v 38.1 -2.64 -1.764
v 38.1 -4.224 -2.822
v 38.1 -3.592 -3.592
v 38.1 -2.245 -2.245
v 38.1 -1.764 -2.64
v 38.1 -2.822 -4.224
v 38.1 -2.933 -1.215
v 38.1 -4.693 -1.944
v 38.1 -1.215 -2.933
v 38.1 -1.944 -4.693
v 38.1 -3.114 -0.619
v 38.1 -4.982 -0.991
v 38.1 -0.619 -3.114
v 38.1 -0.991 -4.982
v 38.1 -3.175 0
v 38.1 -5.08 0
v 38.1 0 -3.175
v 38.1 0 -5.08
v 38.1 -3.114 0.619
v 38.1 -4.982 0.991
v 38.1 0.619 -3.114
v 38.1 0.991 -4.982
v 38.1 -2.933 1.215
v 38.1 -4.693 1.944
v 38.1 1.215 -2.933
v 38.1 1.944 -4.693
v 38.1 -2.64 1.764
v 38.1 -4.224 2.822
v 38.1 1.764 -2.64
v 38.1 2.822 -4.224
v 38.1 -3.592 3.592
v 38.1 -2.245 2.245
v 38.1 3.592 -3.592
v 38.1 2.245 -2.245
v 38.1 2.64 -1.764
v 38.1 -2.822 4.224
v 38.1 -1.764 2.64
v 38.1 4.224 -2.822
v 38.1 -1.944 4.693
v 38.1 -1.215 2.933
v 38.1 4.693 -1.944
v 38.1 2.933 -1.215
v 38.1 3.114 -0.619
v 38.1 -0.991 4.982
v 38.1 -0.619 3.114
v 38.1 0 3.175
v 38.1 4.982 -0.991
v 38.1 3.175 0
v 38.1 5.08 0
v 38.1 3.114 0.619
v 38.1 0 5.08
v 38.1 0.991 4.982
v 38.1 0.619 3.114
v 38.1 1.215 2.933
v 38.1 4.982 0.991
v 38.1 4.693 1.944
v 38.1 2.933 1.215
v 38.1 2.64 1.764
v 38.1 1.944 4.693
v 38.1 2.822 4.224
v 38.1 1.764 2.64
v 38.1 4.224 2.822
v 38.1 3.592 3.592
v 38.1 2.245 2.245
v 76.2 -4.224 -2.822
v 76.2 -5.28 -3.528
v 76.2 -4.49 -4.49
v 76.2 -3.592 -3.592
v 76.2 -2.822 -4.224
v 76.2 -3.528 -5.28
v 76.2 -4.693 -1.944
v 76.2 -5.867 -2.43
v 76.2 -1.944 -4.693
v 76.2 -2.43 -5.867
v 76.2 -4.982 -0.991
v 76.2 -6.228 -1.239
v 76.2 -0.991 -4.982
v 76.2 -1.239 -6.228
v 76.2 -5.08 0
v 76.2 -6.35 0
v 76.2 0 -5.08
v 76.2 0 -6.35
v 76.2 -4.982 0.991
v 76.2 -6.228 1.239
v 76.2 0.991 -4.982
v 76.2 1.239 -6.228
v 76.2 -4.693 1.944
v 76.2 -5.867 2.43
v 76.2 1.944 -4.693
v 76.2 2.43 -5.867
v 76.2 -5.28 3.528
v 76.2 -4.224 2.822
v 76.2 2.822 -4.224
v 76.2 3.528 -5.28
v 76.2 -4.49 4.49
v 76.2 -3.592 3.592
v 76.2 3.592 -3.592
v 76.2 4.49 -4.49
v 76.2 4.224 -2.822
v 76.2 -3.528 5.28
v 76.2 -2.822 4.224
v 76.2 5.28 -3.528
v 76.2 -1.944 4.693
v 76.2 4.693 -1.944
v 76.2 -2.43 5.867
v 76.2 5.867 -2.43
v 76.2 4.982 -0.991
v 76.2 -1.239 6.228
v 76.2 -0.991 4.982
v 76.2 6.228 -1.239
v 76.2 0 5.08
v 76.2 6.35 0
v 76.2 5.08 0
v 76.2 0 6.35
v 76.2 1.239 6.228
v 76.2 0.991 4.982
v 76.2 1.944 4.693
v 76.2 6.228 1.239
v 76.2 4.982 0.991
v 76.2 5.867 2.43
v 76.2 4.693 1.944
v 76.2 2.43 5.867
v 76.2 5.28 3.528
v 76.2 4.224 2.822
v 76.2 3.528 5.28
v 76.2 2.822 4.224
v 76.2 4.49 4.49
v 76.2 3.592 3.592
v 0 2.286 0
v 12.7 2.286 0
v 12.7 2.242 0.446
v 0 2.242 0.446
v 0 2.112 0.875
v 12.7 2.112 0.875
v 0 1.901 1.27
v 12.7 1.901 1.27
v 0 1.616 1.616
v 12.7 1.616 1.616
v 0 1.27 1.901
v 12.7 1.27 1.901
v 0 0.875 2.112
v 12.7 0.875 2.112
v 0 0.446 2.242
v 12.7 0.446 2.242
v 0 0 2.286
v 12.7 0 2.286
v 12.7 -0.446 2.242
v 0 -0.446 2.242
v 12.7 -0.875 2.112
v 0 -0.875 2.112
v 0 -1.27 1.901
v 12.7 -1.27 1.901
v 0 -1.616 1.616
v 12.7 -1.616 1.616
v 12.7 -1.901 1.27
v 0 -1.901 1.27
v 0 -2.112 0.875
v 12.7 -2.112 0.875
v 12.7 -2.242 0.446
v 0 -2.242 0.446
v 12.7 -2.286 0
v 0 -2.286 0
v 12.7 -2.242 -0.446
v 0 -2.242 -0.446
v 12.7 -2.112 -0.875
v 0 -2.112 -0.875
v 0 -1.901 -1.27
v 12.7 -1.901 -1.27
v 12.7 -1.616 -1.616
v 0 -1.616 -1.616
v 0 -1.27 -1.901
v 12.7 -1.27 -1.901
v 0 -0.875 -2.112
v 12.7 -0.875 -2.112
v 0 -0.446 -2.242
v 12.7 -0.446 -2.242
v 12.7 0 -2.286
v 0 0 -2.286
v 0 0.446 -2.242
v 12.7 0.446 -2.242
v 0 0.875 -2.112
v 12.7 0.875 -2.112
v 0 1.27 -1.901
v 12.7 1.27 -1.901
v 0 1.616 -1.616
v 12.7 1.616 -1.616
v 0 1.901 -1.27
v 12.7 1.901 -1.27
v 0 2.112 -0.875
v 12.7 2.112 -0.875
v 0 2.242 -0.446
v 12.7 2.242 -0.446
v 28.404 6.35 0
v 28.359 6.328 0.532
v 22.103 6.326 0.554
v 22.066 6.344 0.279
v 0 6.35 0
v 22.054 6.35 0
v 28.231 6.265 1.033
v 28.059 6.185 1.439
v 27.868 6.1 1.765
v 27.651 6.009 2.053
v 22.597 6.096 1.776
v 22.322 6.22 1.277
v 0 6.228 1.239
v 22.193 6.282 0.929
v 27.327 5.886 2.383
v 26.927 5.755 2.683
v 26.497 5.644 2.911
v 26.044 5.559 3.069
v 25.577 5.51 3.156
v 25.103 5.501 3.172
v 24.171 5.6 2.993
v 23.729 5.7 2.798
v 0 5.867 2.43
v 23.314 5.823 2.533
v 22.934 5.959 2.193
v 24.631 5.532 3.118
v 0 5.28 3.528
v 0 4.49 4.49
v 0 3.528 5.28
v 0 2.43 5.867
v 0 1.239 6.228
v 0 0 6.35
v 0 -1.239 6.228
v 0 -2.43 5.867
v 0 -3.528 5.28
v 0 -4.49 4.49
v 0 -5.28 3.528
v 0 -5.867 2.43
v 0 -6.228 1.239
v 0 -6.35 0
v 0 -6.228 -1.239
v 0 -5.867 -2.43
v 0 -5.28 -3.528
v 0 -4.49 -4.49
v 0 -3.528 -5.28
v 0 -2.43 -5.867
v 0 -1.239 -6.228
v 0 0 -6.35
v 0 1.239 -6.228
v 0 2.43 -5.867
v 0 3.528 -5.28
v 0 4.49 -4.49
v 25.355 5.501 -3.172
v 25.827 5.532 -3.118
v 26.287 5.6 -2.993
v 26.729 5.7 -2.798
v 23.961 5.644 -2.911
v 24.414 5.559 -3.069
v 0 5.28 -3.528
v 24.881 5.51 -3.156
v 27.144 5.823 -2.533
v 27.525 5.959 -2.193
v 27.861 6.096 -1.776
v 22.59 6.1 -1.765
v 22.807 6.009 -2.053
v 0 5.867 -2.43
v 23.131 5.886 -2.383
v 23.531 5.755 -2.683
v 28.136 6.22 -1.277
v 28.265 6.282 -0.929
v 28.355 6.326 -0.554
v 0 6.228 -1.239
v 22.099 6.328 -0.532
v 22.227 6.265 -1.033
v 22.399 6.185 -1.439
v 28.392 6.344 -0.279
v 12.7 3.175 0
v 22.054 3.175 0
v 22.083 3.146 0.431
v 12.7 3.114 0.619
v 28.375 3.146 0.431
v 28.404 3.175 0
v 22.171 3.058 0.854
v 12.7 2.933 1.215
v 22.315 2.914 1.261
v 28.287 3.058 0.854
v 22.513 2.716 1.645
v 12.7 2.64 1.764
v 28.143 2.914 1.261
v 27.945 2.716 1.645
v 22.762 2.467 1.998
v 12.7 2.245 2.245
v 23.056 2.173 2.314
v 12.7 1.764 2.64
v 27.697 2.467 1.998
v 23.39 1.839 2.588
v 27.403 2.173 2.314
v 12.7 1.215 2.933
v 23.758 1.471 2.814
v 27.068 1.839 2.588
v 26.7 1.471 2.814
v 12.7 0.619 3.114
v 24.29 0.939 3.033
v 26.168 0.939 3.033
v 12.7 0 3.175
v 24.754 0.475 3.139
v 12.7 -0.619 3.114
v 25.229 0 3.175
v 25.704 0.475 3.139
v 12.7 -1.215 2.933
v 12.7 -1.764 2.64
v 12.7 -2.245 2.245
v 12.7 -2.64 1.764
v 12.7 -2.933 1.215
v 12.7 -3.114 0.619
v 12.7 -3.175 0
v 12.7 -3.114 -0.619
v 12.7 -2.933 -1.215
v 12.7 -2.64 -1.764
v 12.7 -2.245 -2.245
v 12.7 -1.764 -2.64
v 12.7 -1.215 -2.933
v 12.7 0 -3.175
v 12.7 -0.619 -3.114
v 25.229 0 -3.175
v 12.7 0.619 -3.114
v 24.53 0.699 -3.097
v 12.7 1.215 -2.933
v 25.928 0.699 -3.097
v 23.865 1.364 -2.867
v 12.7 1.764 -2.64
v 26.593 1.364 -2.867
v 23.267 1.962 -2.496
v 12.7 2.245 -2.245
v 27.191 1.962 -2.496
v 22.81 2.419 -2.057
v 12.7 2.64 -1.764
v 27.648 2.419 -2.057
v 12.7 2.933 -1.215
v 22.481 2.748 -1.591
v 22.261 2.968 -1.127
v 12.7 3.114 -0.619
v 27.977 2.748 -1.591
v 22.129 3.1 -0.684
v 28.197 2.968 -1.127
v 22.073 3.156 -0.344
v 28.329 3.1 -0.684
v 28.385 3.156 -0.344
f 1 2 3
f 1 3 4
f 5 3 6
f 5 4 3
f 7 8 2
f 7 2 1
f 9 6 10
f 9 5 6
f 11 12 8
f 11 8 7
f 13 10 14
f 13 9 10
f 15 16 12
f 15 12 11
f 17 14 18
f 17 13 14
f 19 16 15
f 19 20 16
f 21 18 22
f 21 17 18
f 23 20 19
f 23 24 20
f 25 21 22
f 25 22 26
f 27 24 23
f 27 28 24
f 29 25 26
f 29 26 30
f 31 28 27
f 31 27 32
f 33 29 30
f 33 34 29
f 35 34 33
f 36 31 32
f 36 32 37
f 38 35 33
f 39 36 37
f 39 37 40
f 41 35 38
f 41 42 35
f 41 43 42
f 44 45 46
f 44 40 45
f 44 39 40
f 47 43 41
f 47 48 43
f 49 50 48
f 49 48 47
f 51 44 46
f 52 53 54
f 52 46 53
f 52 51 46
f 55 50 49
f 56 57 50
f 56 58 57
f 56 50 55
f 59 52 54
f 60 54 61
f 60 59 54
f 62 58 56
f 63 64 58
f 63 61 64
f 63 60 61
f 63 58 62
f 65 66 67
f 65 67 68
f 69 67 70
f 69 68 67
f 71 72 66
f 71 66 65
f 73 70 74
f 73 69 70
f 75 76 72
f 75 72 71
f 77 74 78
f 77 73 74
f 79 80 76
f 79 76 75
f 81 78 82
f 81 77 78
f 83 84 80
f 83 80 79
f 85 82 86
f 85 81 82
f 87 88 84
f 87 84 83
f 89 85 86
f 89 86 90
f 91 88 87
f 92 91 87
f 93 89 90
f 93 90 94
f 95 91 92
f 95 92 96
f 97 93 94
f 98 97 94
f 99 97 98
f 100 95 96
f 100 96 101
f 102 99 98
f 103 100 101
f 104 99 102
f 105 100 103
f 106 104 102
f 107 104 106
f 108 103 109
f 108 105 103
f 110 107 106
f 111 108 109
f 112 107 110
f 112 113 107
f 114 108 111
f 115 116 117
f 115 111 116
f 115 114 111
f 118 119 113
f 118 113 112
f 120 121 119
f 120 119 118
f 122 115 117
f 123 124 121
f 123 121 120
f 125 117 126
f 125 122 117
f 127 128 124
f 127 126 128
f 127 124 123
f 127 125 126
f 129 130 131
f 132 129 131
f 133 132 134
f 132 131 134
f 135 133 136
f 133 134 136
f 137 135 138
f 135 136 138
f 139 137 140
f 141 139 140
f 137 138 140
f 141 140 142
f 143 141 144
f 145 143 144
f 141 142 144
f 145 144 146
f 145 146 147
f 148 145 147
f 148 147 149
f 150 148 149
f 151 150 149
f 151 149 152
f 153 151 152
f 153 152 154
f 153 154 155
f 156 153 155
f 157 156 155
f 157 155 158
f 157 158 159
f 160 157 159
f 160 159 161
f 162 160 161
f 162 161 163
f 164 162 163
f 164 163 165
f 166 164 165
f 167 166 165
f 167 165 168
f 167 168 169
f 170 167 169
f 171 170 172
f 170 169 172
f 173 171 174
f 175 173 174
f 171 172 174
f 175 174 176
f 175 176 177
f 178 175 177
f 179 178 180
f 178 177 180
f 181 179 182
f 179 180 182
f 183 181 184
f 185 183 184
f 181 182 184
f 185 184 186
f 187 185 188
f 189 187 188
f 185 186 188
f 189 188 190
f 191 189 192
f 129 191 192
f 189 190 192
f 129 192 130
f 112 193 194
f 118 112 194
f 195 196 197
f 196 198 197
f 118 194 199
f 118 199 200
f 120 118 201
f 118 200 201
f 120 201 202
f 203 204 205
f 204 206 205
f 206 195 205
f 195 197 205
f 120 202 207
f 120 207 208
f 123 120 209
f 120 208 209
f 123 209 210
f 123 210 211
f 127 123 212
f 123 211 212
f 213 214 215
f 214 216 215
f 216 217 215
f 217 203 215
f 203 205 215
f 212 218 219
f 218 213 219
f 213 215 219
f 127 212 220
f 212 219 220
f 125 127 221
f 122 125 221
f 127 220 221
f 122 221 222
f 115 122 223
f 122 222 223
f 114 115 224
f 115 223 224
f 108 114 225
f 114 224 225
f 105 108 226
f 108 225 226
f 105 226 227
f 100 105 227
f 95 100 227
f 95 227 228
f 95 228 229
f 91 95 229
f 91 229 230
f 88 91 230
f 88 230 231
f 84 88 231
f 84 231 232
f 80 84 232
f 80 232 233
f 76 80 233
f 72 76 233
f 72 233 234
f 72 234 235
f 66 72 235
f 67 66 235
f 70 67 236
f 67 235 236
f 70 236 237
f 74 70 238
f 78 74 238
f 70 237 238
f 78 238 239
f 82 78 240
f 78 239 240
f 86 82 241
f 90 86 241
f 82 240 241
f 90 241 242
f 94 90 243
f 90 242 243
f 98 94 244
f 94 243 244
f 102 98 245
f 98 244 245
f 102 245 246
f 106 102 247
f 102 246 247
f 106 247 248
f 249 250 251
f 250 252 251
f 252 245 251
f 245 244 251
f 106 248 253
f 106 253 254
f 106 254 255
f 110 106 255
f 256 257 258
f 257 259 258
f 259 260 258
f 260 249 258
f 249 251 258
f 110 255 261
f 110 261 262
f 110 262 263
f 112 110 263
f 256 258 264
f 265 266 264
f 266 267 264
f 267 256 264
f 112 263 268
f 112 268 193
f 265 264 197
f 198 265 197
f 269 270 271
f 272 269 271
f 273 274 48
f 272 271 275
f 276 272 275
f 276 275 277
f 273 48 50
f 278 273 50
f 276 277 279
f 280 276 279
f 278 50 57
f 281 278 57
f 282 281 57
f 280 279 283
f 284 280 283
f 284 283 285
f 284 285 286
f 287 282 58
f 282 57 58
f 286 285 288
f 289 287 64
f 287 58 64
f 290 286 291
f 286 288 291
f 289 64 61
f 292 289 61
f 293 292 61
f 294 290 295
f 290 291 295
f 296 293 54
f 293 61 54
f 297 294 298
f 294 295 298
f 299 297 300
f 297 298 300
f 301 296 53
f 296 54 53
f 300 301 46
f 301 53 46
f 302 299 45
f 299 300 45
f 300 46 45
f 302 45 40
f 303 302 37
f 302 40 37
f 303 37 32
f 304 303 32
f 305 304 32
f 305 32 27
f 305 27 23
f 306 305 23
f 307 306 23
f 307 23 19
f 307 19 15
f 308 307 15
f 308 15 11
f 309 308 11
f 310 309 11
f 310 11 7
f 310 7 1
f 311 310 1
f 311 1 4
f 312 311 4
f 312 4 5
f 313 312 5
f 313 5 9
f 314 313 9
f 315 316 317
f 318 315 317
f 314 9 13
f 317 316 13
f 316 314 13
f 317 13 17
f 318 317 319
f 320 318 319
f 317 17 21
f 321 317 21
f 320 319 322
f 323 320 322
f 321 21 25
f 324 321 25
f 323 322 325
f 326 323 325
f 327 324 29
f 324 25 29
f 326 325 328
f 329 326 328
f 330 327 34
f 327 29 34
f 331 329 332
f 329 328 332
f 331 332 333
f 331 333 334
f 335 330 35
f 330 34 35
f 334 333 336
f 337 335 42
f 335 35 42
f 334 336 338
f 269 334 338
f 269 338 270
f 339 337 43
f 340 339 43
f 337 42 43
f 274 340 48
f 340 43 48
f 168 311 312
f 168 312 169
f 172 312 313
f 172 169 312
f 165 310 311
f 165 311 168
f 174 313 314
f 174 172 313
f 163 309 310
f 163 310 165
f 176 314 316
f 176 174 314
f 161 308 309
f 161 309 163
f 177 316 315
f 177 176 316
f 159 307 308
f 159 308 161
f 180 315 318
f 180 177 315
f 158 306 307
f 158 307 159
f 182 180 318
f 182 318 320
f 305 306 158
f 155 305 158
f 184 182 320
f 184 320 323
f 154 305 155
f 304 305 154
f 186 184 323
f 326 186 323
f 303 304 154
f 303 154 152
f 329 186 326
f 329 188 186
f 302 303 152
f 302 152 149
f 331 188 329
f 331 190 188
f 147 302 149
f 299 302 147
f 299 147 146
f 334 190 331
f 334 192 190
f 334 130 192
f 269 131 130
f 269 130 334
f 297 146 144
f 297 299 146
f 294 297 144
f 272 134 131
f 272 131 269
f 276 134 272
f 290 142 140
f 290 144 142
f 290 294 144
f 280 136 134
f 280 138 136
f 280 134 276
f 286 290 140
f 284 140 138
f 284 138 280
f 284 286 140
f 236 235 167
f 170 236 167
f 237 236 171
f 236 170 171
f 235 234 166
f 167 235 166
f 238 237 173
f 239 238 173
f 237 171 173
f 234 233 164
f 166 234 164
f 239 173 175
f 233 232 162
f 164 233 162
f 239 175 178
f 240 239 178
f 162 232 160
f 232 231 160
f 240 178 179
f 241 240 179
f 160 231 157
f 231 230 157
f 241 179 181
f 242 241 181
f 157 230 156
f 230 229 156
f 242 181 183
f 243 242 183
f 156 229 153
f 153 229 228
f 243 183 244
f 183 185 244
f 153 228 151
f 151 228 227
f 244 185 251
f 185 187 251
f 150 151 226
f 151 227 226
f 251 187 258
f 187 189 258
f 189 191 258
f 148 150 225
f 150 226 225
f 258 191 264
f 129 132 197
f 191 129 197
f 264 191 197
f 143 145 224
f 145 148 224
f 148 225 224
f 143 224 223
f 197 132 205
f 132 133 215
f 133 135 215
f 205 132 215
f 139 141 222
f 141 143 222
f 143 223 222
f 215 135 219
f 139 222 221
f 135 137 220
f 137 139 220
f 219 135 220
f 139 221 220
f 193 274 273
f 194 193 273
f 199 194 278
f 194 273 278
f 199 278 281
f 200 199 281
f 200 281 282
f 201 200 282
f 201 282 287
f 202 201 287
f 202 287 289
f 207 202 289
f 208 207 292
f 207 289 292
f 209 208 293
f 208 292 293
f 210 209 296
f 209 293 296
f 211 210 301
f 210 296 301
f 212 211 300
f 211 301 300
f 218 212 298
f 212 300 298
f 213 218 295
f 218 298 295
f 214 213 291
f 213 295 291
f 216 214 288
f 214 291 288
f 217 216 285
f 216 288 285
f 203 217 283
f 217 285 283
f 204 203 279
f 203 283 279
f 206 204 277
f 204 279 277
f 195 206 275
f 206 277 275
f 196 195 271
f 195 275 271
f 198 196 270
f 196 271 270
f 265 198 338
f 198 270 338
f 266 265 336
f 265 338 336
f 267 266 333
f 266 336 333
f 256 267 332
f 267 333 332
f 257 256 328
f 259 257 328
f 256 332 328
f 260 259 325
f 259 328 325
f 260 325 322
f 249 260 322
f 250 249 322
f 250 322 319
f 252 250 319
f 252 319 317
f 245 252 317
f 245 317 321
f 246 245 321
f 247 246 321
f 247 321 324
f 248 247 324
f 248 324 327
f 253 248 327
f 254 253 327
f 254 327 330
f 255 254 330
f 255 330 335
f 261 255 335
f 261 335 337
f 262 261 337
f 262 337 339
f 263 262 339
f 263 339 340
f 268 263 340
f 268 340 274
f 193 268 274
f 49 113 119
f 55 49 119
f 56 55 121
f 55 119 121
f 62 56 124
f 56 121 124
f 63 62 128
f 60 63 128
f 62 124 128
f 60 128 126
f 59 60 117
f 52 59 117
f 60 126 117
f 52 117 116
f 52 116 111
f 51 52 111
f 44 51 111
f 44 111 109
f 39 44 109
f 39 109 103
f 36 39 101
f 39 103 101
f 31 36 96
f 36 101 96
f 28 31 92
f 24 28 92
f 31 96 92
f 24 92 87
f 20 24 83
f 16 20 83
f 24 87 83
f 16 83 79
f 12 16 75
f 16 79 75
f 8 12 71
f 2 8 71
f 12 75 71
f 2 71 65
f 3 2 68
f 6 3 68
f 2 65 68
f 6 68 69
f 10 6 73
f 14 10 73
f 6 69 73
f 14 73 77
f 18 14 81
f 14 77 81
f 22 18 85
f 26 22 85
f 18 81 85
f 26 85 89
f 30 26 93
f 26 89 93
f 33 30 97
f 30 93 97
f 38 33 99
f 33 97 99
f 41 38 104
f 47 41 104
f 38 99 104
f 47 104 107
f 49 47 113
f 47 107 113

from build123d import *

# Parameters (mm, degrees)
F0_R     = 6.35
F1_DEPTH = 76.2
F2_R     = 5.08
F3_DEPTH = 38.1
F4_R     = 3.175
F5_DEPTH = 25.4
F6_R     = 2.286
F7_DEPTH = 25.4
F8_R     = 3.175
F9_DEPTH = 25.4


with BuildPart() as f1:
    # F0 (on Right) → F1 (new body)
    with BuildSketch(Plane.YZ):
        Circle(F0_R)
    extrude(amount=F1_DEPTH)

    # F2 (on face) → F3 (cut)
    with BuildSketch(Plane.YZ.offset(76.2)):
        Circle(F2_R)
    extrude(amount=-F3_DEPTH, mode=Mode.SUBTRACT)

    # F4 (on face) → F5 (cut)
    with BuildSketch(Plane.YZ.offset(38.1)):
        Circle(F4_R)
    extrude(amount=-F5_DEPTH, mode=Mode.SUBTRACT)

    # F6 (on face) → F7 (cut)
    with BuildSketch(Plane.YZ.offset(12.7)):
        Circle(F6_R)
    extrude(amount=-F7_DEPTH, mode=Mode.SUBTRACT)

    # F8 (on Front) → F9 (cut)
    with BuildSketch(Plane.XZ):
        with Locations((25.229068, 0)):
            Circle(F8_R)
    extrude(amount=-F9_DEPTH, mode=Mode.SUBTRACT)


solid = f1.part
